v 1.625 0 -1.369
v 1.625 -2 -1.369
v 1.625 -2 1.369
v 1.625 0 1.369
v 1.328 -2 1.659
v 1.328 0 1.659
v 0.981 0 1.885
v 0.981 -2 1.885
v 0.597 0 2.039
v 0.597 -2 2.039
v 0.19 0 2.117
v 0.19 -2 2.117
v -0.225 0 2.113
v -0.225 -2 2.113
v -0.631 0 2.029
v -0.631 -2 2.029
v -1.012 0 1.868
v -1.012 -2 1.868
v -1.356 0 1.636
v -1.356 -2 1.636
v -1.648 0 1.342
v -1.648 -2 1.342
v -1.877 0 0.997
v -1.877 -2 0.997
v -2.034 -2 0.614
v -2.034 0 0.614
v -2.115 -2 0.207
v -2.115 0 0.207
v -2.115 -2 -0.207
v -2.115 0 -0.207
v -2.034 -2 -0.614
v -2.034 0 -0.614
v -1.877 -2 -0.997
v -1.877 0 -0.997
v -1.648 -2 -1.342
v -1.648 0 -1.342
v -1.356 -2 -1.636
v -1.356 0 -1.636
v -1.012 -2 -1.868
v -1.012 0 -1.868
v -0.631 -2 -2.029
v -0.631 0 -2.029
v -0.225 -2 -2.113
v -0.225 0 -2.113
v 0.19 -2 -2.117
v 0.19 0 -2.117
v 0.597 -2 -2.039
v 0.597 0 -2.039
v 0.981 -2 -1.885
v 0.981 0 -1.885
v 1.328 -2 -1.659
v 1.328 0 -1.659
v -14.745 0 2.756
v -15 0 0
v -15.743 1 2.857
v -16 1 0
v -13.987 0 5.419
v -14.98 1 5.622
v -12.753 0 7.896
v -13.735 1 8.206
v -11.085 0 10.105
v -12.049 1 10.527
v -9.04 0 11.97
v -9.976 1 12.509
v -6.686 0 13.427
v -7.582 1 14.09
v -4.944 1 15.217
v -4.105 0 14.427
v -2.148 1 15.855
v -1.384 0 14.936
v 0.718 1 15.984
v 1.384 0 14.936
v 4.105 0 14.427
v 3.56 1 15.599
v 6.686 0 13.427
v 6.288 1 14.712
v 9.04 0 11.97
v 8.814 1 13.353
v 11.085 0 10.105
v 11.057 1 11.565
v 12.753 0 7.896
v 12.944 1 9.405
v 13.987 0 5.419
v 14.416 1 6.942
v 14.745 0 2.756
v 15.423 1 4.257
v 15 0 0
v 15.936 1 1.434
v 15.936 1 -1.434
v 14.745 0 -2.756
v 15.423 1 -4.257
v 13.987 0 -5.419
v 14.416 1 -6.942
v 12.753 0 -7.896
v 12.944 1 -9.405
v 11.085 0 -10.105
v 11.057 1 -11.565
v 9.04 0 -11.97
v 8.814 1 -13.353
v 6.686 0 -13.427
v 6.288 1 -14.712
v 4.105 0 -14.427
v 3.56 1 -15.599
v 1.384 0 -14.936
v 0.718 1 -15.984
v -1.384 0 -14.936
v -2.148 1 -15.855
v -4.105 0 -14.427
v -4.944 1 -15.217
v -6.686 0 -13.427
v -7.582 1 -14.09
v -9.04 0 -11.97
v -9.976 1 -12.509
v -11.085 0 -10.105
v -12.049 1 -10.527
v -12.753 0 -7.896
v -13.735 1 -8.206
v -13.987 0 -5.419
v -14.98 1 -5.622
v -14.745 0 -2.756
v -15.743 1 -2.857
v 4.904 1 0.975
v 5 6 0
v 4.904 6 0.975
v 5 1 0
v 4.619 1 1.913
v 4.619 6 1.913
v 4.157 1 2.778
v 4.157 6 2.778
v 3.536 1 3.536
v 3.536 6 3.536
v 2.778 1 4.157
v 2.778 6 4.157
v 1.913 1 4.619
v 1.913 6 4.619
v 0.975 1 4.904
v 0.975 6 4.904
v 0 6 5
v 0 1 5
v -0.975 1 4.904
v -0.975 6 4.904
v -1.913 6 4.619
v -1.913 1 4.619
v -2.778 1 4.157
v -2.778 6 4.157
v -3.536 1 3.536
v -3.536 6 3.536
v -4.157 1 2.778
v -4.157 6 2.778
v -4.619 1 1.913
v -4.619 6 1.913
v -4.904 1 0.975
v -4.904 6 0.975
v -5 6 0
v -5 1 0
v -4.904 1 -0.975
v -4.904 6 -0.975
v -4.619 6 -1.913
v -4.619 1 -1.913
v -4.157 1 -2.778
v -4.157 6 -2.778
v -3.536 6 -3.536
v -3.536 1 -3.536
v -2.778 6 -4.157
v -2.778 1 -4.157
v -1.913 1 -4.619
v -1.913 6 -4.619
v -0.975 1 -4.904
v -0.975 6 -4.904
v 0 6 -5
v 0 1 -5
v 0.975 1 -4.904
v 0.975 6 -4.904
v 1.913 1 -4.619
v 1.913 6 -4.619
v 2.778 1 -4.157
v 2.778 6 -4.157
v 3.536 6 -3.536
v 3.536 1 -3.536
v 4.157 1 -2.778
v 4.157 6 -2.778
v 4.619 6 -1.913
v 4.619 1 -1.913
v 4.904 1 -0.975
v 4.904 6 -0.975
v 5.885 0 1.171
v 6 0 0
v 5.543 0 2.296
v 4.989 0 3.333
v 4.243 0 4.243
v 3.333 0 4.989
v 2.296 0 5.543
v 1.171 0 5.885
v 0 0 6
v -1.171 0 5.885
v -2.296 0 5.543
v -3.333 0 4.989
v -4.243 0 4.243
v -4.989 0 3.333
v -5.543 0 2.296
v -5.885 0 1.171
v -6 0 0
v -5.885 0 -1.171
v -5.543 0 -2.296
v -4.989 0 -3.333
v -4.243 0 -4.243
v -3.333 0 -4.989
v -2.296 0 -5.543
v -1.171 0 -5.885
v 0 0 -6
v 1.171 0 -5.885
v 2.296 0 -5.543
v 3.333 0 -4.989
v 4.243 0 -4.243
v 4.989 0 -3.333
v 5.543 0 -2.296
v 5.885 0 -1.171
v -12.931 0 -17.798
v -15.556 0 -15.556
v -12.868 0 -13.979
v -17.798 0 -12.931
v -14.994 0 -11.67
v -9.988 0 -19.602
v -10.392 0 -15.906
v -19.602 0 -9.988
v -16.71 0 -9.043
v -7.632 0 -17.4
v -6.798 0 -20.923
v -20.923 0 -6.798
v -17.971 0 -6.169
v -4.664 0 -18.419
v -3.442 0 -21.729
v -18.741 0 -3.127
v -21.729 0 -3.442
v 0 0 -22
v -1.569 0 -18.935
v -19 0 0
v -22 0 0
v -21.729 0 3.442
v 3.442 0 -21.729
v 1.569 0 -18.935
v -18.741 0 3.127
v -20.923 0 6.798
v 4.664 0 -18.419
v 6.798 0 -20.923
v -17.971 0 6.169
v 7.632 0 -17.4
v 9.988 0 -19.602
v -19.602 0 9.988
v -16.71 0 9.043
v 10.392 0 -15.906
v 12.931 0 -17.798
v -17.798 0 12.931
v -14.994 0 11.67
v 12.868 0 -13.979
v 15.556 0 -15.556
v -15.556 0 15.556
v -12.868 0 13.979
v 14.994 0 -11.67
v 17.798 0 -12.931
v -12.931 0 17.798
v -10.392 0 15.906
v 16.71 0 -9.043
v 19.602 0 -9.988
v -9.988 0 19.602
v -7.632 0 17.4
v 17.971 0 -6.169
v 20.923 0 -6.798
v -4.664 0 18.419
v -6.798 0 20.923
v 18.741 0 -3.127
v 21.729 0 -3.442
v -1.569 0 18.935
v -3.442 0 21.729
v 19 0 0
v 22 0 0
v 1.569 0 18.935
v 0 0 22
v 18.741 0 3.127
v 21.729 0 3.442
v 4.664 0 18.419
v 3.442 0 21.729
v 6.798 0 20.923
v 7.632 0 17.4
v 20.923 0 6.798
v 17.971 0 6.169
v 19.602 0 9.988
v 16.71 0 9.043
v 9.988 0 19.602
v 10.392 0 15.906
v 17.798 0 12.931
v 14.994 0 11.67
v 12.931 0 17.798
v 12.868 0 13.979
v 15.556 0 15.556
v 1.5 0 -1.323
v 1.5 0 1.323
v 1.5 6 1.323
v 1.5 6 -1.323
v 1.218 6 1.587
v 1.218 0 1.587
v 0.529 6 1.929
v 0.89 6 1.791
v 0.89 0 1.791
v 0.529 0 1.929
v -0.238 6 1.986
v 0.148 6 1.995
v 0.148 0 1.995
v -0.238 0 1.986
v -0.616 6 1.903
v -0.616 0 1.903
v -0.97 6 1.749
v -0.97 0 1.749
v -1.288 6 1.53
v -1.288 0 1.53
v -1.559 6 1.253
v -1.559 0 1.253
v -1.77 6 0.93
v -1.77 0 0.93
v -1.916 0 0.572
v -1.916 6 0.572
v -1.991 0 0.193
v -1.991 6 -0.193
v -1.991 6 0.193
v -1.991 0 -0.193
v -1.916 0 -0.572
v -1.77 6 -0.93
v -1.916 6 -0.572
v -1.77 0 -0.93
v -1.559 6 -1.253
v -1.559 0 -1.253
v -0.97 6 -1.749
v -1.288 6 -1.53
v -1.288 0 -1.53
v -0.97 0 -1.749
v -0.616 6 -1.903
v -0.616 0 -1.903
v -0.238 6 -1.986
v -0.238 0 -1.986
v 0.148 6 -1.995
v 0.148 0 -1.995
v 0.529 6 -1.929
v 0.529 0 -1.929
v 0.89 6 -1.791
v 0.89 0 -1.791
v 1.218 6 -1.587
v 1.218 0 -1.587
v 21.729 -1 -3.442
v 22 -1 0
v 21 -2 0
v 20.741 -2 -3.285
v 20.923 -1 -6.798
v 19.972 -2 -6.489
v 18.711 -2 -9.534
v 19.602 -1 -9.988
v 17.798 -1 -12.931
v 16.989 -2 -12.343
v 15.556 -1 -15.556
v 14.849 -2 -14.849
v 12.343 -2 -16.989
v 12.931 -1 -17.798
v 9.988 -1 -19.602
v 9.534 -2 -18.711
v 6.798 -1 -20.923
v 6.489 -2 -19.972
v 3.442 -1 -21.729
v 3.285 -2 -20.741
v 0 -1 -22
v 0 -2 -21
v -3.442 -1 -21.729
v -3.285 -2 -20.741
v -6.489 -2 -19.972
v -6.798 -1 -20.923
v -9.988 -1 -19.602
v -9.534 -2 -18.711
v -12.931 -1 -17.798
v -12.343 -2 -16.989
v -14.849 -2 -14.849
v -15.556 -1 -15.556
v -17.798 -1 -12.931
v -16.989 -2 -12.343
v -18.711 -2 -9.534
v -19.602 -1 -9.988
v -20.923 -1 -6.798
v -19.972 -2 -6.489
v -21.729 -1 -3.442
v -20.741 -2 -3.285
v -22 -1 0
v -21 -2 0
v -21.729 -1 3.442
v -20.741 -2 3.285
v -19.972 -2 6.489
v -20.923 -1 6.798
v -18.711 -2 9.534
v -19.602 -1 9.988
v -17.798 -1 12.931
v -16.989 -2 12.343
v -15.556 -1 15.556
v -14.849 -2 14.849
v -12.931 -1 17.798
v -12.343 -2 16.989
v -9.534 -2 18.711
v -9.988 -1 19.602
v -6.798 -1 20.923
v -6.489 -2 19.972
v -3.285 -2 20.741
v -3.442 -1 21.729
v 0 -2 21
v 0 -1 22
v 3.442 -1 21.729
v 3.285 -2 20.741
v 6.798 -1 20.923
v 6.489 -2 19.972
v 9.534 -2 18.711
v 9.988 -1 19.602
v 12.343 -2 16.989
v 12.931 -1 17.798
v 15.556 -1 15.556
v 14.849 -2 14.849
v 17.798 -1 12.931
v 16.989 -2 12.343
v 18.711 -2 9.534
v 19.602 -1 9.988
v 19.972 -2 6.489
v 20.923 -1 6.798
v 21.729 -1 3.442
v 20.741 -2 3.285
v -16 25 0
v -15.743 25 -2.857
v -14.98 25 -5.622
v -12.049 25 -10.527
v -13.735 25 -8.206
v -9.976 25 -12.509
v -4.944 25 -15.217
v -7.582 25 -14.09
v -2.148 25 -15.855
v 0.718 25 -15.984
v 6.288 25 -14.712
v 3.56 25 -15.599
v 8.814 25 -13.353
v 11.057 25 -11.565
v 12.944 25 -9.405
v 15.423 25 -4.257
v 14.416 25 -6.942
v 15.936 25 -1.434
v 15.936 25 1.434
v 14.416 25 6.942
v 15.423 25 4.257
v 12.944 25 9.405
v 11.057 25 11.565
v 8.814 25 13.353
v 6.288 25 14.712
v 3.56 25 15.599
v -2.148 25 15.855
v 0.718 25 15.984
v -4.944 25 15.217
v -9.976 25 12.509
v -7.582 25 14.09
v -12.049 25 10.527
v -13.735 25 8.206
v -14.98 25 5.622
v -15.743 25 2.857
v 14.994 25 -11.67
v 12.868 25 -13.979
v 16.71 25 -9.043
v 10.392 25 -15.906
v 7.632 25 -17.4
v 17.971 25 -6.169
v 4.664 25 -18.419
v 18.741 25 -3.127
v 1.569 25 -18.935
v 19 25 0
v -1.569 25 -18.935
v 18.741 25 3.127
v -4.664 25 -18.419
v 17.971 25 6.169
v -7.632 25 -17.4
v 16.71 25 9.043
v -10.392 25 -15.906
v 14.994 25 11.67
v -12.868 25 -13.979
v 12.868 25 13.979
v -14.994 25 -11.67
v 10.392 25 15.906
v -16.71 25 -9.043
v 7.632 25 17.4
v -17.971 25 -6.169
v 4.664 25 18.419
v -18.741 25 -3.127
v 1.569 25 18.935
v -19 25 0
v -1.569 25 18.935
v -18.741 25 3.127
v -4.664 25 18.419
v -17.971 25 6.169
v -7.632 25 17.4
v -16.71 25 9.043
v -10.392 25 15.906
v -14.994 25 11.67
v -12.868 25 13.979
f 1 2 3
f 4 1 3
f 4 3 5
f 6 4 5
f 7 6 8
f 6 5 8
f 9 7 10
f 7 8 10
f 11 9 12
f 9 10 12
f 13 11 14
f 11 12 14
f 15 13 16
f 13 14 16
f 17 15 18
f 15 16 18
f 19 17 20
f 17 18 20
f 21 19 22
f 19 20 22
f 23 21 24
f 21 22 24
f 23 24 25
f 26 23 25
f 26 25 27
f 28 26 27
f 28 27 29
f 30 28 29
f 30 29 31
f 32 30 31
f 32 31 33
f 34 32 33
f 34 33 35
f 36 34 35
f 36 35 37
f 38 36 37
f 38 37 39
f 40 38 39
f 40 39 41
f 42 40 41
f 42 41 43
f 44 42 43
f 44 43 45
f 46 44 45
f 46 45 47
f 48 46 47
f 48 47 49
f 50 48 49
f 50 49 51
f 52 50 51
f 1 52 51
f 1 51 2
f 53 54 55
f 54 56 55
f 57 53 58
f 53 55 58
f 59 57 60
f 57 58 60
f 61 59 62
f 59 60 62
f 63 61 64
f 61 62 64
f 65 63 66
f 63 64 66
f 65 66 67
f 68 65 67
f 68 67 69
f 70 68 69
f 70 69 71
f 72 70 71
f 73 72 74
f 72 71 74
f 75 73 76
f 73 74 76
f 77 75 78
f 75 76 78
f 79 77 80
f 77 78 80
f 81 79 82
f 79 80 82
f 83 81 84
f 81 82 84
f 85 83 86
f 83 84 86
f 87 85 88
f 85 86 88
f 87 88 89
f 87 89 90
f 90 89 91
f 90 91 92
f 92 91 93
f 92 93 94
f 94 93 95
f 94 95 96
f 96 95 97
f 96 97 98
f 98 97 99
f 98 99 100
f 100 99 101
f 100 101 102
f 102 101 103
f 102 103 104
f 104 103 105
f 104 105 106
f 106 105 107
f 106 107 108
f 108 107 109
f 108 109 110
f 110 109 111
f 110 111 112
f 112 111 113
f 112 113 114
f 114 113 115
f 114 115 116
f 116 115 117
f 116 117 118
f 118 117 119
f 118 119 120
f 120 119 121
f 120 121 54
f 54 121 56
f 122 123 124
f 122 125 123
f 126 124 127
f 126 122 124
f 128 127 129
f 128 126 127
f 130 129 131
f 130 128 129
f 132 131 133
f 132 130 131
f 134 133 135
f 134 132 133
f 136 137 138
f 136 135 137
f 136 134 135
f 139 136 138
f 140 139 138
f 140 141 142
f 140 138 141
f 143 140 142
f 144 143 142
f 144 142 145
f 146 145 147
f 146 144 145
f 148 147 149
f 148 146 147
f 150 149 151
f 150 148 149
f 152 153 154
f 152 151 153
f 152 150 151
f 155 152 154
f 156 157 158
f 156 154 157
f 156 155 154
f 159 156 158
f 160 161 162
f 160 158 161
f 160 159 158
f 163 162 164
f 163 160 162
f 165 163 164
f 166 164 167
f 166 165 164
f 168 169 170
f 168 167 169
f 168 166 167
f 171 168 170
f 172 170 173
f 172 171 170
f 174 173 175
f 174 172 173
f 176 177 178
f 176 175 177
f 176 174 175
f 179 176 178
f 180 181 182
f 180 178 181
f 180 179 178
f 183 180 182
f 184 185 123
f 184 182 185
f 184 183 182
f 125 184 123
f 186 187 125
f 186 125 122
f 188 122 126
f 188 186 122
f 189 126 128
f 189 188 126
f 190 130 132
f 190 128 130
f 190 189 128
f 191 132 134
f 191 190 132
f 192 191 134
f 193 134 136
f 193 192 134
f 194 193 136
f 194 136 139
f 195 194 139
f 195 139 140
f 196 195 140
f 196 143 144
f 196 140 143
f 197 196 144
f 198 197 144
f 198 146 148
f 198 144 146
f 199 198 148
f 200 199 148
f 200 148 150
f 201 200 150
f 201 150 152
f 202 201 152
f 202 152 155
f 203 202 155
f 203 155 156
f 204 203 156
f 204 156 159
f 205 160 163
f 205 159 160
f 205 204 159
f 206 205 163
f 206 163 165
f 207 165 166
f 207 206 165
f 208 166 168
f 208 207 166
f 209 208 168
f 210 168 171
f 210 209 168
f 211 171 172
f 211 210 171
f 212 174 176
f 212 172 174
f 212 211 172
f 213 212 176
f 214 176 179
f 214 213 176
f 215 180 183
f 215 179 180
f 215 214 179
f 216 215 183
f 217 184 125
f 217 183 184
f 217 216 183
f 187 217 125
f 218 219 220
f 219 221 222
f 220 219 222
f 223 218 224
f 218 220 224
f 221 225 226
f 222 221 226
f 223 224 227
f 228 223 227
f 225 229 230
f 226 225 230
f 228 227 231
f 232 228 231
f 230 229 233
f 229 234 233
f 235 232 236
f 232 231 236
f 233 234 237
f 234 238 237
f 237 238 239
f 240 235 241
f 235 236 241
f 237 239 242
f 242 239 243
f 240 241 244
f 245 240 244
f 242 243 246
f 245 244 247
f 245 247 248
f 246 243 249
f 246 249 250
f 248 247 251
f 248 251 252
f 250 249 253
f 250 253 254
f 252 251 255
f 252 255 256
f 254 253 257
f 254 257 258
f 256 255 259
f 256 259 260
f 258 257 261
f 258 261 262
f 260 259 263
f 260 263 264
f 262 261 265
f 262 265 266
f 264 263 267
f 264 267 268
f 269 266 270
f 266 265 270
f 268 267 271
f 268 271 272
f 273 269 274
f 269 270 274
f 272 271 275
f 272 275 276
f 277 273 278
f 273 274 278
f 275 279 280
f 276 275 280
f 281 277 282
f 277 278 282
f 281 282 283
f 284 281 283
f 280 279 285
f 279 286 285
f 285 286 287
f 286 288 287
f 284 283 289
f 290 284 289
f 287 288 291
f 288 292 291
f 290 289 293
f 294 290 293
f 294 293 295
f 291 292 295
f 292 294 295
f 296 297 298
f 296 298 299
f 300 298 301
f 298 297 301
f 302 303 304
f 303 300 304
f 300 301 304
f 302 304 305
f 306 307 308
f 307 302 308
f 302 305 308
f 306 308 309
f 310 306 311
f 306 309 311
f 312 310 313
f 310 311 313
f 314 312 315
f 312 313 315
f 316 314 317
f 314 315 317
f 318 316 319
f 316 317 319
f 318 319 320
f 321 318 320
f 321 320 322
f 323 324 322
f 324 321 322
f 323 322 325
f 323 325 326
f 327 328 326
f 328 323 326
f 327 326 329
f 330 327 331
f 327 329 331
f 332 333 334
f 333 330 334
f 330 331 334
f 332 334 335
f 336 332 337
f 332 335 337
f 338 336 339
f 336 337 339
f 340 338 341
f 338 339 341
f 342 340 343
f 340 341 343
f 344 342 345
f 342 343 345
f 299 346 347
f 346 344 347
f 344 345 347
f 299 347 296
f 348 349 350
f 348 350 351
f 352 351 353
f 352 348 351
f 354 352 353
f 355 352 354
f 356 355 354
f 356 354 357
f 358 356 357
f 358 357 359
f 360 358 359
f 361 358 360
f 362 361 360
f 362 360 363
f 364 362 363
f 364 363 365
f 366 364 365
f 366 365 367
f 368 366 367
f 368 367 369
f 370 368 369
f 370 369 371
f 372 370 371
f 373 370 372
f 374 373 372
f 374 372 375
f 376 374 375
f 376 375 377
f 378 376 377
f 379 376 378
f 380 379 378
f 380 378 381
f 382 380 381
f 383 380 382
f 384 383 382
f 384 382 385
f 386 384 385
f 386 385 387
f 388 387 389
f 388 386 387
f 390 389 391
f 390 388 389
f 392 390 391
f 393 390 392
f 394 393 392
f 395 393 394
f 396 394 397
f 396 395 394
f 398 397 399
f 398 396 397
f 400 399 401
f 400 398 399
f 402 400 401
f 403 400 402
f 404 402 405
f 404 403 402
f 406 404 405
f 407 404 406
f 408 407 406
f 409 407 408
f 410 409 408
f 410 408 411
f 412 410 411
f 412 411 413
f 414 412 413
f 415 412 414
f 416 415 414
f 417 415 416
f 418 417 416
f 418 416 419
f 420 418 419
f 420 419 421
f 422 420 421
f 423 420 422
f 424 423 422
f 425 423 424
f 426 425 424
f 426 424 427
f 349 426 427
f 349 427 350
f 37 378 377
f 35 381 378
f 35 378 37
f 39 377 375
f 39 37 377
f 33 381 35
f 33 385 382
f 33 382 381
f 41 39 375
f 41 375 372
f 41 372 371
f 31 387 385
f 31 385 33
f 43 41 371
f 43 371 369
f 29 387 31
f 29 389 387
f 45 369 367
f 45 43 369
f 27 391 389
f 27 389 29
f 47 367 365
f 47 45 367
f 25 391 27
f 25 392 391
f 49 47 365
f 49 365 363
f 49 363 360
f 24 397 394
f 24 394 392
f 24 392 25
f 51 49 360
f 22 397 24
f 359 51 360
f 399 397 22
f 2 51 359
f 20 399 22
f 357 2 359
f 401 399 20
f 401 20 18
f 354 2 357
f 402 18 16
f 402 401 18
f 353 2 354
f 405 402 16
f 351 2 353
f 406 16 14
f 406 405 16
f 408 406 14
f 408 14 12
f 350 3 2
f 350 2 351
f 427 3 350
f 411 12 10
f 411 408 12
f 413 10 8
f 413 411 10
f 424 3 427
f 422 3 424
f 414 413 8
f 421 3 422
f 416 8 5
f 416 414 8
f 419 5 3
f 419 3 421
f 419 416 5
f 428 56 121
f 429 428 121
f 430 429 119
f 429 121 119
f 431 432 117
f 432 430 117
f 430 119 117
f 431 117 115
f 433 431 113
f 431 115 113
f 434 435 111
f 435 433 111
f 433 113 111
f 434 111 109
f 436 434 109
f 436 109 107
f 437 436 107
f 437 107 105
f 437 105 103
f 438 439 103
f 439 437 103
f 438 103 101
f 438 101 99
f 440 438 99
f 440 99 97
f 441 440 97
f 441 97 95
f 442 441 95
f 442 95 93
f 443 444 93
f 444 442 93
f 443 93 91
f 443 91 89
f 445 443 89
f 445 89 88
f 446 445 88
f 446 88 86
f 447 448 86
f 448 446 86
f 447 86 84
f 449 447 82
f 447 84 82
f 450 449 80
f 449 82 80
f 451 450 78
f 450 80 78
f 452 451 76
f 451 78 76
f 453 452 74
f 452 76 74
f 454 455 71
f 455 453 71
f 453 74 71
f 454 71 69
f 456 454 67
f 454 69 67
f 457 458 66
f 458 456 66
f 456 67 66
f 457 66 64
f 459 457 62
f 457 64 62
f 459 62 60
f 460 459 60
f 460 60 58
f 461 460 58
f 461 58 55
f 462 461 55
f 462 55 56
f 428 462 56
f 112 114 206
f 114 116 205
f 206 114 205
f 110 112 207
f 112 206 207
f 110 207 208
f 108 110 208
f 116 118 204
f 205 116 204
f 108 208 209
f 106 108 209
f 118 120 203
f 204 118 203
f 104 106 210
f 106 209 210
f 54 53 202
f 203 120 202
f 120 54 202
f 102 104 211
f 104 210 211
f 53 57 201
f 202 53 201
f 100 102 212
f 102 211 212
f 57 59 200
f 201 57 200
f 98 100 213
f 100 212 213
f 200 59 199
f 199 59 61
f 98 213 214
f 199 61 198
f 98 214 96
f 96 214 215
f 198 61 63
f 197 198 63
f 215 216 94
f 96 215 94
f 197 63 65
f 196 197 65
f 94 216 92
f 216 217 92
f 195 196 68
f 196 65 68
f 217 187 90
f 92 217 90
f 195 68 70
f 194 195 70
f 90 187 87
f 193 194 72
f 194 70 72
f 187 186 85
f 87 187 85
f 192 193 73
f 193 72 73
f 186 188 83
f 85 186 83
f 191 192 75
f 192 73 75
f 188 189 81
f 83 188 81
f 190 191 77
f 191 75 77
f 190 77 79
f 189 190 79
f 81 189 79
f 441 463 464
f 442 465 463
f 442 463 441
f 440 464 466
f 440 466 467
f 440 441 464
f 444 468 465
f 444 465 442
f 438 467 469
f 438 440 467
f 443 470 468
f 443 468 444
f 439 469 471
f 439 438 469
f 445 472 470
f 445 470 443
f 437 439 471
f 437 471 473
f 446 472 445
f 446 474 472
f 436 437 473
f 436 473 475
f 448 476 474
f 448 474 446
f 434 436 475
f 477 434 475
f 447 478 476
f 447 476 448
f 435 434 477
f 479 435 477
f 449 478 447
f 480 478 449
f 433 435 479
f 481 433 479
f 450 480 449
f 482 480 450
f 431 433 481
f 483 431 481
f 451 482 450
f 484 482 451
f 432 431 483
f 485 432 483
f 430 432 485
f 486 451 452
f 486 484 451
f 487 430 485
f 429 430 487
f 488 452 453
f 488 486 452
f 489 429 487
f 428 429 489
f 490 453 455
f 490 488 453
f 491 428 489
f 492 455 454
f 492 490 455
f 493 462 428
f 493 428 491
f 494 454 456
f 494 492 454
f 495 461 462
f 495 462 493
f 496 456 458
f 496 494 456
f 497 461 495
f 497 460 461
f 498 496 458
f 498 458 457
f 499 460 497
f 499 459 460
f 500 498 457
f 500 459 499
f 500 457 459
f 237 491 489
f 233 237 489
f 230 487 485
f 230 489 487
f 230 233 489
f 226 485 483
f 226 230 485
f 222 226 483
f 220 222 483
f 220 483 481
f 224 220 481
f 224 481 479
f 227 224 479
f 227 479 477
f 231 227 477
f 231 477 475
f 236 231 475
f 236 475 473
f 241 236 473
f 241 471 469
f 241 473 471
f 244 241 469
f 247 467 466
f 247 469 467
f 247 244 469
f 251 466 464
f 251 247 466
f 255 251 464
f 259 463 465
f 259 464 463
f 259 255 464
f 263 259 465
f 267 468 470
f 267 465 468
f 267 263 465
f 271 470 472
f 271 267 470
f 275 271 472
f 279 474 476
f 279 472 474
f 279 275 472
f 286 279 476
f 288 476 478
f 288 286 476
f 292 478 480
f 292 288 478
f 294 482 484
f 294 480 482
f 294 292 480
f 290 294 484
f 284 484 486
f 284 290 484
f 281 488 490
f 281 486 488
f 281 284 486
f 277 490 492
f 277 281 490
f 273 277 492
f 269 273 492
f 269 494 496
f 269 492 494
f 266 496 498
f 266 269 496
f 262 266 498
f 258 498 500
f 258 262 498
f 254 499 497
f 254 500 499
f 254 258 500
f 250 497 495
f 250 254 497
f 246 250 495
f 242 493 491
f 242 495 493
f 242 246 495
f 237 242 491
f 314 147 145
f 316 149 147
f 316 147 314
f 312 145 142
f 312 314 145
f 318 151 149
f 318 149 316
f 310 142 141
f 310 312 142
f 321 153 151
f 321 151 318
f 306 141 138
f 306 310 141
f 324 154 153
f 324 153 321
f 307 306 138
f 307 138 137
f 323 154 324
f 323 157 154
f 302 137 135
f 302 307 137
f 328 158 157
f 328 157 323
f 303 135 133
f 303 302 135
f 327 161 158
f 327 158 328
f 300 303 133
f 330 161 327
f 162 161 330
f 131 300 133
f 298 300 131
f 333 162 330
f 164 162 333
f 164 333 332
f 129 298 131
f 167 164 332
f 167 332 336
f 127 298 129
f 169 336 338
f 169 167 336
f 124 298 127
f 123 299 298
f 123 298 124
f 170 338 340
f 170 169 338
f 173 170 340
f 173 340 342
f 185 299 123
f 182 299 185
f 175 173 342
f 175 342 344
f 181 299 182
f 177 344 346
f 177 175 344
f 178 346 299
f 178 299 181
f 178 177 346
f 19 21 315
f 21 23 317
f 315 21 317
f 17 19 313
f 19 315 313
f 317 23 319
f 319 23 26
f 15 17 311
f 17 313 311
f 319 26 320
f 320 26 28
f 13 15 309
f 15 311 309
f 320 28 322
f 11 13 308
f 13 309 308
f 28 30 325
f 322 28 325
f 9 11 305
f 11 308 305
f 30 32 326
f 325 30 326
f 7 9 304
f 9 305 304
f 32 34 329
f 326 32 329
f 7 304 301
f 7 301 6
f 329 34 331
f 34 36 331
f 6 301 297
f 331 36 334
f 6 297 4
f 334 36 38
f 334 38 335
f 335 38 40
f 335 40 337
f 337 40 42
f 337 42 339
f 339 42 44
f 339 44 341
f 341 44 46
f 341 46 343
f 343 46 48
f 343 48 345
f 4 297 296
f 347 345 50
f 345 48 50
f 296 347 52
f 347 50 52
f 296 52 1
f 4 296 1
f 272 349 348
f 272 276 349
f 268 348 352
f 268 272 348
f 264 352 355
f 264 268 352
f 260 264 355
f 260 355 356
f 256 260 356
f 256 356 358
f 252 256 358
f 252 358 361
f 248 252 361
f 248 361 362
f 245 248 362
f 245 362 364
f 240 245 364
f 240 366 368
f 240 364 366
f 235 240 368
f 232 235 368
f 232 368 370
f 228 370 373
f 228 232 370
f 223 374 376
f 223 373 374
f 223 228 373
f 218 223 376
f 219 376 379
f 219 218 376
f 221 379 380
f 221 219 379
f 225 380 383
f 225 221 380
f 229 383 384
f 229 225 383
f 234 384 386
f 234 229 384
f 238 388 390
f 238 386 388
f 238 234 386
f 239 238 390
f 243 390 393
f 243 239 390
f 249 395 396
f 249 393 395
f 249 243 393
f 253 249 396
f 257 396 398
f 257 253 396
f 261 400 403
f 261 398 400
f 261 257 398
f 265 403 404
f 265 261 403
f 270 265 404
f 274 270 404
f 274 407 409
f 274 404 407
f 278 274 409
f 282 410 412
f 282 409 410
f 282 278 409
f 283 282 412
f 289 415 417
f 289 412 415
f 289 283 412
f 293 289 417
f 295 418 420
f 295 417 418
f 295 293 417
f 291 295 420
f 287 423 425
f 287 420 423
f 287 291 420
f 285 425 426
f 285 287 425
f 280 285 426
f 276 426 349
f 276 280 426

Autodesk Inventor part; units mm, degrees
ref_plane "YZ Plane" through (0, 0, 0) normal (1, 0, 0) x (0, 1, 0)
ref_plane "XZ Plane" through (0, 0, 0) normal (0, 1, 0) x (-1, 0, 0)
sketch "Sketch1" plane through (0, 0, 0) normal (0, 1, 0) x (-1, 0, 0)
  circle A0 centre (0, 0) radius 19
  circle A1 centre (0, 0) radius 16
  dimension "d0" = 38
  dimension "d1" = 3
extrude "Extrusion1" add sketch "Sketch1" along normal blind 25
sketch "Sketch2" plane through (0, 0, 0) normal (0, -1, 0) x (1, 0, 0)
  circle A0 centre (0, 0) radius 22
  circle A1 centre (0, 0) radius 19 projected
  dimension "d4" = 3
extrude "Extrusion2" add sketch "Sketch2" along normal blind 2 contours A0 | A1
ref_plane "Work Plane1" through (0, -2, 0) normal (0, -1, 0) x (1, 0, 0)
sketch "Sketch3" plane through (0, -2, 0) normal (0, -1, 0) x (1, 0, 0)
  circle A0 centre (0, 0) radius 2.125
  line L0 (1.625, -4.5) -> (1.625, 4.5)
  point P0 (1.625, -1.3693)
  point P1 (1.625, 1.3693)
  dimension "d8" = 4.25
  dimension "d9" = 9
  dimension "d10" = 4.5
  dimension "d11" = 1.625
extrude "Extrusion3" cut sketch "Sketch3" against normal blind 28 contours L0 A0 picked at (0.375, 0)
sketch "Sketch4" plane through (0, 0, 0) normal (0, 1, 0) x (1, 0, 0)
  circle A0 centre (0, 0) radius 5
  circle A1 centre (0, 0) radius 2
  line L0 (1.5, -1.3229) -> (1.5, 1.3229) projected
  line L1 (1.5, 1.3229) -> (1.5, -1.3229)
  dimension "d14" = 3
  dimension "d15" = 4
extrude "Extrusion4" add sketch "Sketch4" along normal blind 6 contours A0 | A1 L0 picked at (1.5908, -0.3089)
chamfer "Chamfer1" distance 1 angle 45 1 edges at (-22, -2, 0)
chamfer "Chamfer2" distance 1 angle 45 2 edges at (16, 0, 0) (-5, 0, 0)
properties part number "Kolo" material "Glass"
